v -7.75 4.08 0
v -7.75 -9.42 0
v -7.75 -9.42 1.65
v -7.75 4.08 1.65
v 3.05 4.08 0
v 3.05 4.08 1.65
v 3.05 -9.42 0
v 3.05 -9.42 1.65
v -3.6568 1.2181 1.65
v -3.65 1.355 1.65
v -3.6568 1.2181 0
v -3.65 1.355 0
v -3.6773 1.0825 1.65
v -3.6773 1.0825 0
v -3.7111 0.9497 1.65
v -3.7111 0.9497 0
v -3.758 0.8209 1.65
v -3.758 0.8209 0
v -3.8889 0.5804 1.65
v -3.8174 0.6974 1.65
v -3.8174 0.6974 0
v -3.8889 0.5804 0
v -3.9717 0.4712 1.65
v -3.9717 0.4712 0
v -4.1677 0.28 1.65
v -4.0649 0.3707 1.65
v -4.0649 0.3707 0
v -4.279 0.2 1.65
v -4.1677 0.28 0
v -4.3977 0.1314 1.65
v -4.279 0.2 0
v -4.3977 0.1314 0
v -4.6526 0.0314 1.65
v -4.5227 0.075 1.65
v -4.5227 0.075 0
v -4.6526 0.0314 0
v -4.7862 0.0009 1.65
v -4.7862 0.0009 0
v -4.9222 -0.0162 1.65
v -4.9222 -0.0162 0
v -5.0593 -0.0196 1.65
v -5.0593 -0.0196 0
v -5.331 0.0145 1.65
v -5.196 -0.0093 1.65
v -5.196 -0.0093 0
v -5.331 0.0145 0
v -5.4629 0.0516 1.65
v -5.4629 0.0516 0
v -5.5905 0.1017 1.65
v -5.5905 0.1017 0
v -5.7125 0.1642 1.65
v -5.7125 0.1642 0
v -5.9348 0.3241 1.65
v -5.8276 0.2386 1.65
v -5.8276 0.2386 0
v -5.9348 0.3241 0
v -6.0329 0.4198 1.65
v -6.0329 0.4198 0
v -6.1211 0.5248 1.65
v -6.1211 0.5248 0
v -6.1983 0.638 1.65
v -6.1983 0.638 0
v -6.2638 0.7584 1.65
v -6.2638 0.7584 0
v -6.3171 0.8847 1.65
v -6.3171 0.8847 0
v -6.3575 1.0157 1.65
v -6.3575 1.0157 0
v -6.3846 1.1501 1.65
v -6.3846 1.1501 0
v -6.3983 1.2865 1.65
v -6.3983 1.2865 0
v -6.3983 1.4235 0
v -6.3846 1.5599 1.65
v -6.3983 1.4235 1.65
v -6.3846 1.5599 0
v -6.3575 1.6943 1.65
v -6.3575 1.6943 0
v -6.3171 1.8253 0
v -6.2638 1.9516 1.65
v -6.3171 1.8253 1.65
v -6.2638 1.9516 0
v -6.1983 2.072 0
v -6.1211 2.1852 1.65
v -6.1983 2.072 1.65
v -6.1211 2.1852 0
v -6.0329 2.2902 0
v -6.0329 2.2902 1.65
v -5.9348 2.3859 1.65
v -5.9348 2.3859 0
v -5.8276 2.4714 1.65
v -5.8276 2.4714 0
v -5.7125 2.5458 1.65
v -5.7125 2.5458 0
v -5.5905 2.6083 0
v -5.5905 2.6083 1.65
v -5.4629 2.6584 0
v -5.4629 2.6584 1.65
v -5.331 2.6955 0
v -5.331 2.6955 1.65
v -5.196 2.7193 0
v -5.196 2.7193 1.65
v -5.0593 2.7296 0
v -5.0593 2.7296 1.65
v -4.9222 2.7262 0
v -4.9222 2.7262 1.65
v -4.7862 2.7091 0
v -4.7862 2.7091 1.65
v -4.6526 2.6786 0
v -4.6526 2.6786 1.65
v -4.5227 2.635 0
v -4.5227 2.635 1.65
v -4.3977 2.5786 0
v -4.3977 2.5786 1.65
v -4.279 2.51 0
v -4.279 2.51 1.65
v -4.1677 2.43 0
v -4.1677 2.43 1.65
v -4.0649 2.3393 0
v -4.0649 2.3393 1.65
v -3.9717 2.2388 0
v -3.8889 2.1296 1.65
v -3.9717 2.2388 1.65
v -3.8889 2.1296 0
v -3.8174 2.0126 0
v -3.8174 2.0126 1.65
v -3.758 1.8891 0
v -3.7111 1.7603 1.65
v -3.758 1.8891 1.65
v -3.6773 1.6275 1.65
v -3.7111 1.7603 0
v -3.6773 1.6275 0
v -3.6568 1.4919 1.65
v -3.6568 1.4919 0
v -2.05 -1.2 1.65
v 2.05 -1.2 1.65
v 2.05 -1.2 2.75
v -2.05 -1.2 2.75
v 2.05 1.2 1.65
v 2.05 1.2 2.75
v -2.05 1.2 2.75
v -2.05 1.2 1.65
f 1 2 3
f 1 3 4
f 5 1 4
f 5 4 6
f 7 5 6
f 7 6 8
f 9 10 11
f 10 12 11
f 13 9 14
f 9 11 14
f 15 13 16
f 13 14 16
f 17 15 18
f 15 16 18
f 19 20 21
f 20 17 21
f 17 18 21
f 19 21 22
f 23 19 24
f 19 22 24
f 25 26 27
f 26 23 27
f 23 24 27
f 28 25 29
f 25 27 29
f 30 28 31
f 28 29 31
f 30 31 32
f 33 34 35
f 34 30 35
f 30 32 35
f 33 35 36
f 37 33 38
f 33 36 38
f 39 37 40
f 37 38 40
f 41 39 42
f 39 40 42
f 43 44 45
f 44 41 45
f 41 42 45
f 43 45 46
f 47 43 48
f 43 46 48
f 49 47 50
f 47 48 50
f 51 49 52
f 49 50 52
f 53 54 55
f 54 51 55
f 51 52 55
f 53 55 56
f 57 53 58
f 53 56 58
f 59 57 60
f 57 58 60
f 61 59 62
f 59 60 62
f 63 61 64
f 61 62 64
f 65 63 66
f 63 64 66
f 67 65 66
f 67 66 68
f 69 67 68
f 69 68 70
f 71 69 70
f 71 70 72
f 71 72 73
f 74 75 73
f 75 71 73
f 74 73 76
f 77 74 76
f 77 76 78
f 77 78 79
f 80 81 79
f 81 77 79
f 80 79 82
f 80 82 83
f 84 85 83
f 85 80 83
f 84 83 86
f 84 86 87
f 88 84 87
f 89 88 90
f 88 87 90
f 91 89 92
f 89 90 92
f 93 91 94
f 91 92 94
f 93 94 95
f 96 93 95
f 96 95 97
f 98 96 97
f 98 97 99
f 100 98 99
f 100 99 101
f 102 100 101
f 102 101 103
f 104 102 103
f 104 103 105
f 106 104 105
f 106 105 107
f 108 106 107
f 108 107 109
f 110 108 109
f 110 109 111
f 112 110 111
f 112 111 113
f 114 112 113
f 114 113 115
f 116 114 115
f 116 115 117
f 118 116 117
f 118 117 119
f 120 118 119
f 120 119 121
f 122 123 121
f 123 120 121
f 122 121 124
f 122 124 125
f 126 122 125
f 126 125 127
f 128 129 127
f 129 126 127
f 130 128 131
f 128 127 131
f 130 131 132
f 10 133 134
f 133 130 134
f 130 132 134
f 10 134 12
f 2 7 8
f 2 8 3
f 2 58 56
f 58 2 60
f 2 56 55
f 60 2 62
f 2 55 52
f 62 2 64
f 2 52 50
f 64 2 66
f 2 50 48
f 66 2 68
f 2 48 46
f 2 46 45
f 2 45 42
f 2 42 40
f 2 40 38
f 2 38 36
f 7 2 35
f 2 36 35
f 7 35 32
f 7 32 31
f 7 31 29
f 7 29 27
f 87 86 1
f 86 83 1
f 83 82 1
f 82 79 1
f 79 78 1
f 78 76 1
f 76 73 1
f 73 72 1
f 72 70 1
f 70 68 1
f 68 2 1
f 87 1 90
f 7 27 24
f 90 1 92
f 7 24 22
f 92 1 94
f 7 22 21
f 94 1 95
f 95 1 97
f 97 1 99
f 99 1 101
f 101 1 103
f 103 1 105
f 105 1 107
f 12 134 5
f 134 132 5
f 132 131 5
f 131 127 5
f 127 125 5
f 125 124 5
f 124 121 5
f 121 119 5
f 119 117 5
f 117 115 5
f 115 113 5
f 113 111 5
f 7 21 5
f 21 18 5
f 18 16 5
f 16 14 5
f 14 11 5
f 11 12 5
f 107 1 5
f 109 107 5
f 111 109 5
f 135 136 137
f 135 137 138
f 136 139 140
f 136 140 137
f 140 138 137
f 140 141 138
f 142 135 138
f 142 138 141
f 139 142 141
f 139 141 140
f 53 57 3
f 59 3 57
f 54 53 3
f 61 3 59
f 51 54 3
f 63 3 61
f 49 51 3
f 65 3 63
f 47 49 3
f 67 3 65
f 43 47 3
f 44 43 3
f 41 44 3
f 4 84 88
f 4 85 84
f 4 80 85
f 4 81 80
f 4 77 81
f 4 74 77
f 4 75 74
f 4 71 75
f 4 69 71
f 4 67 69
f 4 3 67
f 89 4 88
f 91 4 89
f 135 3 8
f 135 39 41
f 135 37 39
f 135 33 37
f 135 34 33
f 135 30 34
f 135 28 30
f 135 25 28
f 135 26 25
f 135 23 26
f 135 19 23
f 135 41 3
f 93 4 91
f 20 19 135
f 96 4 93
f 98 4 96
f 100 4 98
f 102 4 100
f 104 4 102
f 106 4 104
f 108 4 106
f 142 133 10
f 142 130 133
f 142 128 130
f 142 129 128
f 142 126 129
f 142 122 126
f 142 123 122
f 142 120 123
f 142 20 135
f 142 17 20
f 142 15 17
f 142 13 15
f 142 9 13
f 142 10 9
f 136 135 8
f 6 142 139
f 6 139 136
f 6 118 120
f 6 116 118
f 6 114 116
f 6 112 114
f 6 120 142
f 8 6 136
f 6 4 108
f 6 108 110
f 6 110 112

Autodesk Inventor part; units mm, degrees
ref_plane "YZ Plane" through (0, 0, 0) normal (1, 0, 0) x (0, 1, 0)
ref_plane "XZ Plane" through (0, 0, 0) normal (0, 1, 0) x (-1, 0, 0)
ref_plane "XY Plane" through (0, 0, 0) normal (0, 0, 1) x (1, 0, 0)
sketch "Sketch1" plane through (0, 0, 0) normal (0, 0, 1) x (1, 0, 0)
  line L0 (-7.75, 4.08) -> (3.05, 4.08)
  line L1 (3.05, 4.08) -> (3.05, -9.42)
  line L2 (3.05, -9.42) -> (-7.75, -9.42)
  line L3 (-7.75, -9.42) -> (-7.75, 4.08)
  circle A0 centre (-5.025, 1.355) radius 1.375
  line L4 (-2.05, 1.2) -> (2.05, 1.2)
  line L5 (2.05, 1.2) -> (2.05, -1.2)
  line L6 (2.05, -1.2) -> (-2.05, -1.2)
  line L7 (-2.05, -1.2) -> (-2.05, 1.2)
  line L8 (-2.05, 0) -> (2.05, 0)
  line L9 (0, 1.2) -> (0, 0)
  dimension "d0" = 10.8
  dimension "d1" = 13.5
  dimension "d3" = 2.725
  dimension "d4" = 2.75
  dimension "d5" = 4.1
  dimension "d6" = 2.4
  dimension "d8" = 2.88
  dimension "d13" = 1
  dimension "d14" = 2.725
extrude "Extrusion1" add sketch "Sketch1" along normal blind 1.65
extrude "Extrusion2" add sketch "Sketch1" along normal blind 2.75 contours L4 L9 L8 L7 | L4 L5 L8 L9 | L8 L5 L6 L7
properties part number "VL53LDK"
